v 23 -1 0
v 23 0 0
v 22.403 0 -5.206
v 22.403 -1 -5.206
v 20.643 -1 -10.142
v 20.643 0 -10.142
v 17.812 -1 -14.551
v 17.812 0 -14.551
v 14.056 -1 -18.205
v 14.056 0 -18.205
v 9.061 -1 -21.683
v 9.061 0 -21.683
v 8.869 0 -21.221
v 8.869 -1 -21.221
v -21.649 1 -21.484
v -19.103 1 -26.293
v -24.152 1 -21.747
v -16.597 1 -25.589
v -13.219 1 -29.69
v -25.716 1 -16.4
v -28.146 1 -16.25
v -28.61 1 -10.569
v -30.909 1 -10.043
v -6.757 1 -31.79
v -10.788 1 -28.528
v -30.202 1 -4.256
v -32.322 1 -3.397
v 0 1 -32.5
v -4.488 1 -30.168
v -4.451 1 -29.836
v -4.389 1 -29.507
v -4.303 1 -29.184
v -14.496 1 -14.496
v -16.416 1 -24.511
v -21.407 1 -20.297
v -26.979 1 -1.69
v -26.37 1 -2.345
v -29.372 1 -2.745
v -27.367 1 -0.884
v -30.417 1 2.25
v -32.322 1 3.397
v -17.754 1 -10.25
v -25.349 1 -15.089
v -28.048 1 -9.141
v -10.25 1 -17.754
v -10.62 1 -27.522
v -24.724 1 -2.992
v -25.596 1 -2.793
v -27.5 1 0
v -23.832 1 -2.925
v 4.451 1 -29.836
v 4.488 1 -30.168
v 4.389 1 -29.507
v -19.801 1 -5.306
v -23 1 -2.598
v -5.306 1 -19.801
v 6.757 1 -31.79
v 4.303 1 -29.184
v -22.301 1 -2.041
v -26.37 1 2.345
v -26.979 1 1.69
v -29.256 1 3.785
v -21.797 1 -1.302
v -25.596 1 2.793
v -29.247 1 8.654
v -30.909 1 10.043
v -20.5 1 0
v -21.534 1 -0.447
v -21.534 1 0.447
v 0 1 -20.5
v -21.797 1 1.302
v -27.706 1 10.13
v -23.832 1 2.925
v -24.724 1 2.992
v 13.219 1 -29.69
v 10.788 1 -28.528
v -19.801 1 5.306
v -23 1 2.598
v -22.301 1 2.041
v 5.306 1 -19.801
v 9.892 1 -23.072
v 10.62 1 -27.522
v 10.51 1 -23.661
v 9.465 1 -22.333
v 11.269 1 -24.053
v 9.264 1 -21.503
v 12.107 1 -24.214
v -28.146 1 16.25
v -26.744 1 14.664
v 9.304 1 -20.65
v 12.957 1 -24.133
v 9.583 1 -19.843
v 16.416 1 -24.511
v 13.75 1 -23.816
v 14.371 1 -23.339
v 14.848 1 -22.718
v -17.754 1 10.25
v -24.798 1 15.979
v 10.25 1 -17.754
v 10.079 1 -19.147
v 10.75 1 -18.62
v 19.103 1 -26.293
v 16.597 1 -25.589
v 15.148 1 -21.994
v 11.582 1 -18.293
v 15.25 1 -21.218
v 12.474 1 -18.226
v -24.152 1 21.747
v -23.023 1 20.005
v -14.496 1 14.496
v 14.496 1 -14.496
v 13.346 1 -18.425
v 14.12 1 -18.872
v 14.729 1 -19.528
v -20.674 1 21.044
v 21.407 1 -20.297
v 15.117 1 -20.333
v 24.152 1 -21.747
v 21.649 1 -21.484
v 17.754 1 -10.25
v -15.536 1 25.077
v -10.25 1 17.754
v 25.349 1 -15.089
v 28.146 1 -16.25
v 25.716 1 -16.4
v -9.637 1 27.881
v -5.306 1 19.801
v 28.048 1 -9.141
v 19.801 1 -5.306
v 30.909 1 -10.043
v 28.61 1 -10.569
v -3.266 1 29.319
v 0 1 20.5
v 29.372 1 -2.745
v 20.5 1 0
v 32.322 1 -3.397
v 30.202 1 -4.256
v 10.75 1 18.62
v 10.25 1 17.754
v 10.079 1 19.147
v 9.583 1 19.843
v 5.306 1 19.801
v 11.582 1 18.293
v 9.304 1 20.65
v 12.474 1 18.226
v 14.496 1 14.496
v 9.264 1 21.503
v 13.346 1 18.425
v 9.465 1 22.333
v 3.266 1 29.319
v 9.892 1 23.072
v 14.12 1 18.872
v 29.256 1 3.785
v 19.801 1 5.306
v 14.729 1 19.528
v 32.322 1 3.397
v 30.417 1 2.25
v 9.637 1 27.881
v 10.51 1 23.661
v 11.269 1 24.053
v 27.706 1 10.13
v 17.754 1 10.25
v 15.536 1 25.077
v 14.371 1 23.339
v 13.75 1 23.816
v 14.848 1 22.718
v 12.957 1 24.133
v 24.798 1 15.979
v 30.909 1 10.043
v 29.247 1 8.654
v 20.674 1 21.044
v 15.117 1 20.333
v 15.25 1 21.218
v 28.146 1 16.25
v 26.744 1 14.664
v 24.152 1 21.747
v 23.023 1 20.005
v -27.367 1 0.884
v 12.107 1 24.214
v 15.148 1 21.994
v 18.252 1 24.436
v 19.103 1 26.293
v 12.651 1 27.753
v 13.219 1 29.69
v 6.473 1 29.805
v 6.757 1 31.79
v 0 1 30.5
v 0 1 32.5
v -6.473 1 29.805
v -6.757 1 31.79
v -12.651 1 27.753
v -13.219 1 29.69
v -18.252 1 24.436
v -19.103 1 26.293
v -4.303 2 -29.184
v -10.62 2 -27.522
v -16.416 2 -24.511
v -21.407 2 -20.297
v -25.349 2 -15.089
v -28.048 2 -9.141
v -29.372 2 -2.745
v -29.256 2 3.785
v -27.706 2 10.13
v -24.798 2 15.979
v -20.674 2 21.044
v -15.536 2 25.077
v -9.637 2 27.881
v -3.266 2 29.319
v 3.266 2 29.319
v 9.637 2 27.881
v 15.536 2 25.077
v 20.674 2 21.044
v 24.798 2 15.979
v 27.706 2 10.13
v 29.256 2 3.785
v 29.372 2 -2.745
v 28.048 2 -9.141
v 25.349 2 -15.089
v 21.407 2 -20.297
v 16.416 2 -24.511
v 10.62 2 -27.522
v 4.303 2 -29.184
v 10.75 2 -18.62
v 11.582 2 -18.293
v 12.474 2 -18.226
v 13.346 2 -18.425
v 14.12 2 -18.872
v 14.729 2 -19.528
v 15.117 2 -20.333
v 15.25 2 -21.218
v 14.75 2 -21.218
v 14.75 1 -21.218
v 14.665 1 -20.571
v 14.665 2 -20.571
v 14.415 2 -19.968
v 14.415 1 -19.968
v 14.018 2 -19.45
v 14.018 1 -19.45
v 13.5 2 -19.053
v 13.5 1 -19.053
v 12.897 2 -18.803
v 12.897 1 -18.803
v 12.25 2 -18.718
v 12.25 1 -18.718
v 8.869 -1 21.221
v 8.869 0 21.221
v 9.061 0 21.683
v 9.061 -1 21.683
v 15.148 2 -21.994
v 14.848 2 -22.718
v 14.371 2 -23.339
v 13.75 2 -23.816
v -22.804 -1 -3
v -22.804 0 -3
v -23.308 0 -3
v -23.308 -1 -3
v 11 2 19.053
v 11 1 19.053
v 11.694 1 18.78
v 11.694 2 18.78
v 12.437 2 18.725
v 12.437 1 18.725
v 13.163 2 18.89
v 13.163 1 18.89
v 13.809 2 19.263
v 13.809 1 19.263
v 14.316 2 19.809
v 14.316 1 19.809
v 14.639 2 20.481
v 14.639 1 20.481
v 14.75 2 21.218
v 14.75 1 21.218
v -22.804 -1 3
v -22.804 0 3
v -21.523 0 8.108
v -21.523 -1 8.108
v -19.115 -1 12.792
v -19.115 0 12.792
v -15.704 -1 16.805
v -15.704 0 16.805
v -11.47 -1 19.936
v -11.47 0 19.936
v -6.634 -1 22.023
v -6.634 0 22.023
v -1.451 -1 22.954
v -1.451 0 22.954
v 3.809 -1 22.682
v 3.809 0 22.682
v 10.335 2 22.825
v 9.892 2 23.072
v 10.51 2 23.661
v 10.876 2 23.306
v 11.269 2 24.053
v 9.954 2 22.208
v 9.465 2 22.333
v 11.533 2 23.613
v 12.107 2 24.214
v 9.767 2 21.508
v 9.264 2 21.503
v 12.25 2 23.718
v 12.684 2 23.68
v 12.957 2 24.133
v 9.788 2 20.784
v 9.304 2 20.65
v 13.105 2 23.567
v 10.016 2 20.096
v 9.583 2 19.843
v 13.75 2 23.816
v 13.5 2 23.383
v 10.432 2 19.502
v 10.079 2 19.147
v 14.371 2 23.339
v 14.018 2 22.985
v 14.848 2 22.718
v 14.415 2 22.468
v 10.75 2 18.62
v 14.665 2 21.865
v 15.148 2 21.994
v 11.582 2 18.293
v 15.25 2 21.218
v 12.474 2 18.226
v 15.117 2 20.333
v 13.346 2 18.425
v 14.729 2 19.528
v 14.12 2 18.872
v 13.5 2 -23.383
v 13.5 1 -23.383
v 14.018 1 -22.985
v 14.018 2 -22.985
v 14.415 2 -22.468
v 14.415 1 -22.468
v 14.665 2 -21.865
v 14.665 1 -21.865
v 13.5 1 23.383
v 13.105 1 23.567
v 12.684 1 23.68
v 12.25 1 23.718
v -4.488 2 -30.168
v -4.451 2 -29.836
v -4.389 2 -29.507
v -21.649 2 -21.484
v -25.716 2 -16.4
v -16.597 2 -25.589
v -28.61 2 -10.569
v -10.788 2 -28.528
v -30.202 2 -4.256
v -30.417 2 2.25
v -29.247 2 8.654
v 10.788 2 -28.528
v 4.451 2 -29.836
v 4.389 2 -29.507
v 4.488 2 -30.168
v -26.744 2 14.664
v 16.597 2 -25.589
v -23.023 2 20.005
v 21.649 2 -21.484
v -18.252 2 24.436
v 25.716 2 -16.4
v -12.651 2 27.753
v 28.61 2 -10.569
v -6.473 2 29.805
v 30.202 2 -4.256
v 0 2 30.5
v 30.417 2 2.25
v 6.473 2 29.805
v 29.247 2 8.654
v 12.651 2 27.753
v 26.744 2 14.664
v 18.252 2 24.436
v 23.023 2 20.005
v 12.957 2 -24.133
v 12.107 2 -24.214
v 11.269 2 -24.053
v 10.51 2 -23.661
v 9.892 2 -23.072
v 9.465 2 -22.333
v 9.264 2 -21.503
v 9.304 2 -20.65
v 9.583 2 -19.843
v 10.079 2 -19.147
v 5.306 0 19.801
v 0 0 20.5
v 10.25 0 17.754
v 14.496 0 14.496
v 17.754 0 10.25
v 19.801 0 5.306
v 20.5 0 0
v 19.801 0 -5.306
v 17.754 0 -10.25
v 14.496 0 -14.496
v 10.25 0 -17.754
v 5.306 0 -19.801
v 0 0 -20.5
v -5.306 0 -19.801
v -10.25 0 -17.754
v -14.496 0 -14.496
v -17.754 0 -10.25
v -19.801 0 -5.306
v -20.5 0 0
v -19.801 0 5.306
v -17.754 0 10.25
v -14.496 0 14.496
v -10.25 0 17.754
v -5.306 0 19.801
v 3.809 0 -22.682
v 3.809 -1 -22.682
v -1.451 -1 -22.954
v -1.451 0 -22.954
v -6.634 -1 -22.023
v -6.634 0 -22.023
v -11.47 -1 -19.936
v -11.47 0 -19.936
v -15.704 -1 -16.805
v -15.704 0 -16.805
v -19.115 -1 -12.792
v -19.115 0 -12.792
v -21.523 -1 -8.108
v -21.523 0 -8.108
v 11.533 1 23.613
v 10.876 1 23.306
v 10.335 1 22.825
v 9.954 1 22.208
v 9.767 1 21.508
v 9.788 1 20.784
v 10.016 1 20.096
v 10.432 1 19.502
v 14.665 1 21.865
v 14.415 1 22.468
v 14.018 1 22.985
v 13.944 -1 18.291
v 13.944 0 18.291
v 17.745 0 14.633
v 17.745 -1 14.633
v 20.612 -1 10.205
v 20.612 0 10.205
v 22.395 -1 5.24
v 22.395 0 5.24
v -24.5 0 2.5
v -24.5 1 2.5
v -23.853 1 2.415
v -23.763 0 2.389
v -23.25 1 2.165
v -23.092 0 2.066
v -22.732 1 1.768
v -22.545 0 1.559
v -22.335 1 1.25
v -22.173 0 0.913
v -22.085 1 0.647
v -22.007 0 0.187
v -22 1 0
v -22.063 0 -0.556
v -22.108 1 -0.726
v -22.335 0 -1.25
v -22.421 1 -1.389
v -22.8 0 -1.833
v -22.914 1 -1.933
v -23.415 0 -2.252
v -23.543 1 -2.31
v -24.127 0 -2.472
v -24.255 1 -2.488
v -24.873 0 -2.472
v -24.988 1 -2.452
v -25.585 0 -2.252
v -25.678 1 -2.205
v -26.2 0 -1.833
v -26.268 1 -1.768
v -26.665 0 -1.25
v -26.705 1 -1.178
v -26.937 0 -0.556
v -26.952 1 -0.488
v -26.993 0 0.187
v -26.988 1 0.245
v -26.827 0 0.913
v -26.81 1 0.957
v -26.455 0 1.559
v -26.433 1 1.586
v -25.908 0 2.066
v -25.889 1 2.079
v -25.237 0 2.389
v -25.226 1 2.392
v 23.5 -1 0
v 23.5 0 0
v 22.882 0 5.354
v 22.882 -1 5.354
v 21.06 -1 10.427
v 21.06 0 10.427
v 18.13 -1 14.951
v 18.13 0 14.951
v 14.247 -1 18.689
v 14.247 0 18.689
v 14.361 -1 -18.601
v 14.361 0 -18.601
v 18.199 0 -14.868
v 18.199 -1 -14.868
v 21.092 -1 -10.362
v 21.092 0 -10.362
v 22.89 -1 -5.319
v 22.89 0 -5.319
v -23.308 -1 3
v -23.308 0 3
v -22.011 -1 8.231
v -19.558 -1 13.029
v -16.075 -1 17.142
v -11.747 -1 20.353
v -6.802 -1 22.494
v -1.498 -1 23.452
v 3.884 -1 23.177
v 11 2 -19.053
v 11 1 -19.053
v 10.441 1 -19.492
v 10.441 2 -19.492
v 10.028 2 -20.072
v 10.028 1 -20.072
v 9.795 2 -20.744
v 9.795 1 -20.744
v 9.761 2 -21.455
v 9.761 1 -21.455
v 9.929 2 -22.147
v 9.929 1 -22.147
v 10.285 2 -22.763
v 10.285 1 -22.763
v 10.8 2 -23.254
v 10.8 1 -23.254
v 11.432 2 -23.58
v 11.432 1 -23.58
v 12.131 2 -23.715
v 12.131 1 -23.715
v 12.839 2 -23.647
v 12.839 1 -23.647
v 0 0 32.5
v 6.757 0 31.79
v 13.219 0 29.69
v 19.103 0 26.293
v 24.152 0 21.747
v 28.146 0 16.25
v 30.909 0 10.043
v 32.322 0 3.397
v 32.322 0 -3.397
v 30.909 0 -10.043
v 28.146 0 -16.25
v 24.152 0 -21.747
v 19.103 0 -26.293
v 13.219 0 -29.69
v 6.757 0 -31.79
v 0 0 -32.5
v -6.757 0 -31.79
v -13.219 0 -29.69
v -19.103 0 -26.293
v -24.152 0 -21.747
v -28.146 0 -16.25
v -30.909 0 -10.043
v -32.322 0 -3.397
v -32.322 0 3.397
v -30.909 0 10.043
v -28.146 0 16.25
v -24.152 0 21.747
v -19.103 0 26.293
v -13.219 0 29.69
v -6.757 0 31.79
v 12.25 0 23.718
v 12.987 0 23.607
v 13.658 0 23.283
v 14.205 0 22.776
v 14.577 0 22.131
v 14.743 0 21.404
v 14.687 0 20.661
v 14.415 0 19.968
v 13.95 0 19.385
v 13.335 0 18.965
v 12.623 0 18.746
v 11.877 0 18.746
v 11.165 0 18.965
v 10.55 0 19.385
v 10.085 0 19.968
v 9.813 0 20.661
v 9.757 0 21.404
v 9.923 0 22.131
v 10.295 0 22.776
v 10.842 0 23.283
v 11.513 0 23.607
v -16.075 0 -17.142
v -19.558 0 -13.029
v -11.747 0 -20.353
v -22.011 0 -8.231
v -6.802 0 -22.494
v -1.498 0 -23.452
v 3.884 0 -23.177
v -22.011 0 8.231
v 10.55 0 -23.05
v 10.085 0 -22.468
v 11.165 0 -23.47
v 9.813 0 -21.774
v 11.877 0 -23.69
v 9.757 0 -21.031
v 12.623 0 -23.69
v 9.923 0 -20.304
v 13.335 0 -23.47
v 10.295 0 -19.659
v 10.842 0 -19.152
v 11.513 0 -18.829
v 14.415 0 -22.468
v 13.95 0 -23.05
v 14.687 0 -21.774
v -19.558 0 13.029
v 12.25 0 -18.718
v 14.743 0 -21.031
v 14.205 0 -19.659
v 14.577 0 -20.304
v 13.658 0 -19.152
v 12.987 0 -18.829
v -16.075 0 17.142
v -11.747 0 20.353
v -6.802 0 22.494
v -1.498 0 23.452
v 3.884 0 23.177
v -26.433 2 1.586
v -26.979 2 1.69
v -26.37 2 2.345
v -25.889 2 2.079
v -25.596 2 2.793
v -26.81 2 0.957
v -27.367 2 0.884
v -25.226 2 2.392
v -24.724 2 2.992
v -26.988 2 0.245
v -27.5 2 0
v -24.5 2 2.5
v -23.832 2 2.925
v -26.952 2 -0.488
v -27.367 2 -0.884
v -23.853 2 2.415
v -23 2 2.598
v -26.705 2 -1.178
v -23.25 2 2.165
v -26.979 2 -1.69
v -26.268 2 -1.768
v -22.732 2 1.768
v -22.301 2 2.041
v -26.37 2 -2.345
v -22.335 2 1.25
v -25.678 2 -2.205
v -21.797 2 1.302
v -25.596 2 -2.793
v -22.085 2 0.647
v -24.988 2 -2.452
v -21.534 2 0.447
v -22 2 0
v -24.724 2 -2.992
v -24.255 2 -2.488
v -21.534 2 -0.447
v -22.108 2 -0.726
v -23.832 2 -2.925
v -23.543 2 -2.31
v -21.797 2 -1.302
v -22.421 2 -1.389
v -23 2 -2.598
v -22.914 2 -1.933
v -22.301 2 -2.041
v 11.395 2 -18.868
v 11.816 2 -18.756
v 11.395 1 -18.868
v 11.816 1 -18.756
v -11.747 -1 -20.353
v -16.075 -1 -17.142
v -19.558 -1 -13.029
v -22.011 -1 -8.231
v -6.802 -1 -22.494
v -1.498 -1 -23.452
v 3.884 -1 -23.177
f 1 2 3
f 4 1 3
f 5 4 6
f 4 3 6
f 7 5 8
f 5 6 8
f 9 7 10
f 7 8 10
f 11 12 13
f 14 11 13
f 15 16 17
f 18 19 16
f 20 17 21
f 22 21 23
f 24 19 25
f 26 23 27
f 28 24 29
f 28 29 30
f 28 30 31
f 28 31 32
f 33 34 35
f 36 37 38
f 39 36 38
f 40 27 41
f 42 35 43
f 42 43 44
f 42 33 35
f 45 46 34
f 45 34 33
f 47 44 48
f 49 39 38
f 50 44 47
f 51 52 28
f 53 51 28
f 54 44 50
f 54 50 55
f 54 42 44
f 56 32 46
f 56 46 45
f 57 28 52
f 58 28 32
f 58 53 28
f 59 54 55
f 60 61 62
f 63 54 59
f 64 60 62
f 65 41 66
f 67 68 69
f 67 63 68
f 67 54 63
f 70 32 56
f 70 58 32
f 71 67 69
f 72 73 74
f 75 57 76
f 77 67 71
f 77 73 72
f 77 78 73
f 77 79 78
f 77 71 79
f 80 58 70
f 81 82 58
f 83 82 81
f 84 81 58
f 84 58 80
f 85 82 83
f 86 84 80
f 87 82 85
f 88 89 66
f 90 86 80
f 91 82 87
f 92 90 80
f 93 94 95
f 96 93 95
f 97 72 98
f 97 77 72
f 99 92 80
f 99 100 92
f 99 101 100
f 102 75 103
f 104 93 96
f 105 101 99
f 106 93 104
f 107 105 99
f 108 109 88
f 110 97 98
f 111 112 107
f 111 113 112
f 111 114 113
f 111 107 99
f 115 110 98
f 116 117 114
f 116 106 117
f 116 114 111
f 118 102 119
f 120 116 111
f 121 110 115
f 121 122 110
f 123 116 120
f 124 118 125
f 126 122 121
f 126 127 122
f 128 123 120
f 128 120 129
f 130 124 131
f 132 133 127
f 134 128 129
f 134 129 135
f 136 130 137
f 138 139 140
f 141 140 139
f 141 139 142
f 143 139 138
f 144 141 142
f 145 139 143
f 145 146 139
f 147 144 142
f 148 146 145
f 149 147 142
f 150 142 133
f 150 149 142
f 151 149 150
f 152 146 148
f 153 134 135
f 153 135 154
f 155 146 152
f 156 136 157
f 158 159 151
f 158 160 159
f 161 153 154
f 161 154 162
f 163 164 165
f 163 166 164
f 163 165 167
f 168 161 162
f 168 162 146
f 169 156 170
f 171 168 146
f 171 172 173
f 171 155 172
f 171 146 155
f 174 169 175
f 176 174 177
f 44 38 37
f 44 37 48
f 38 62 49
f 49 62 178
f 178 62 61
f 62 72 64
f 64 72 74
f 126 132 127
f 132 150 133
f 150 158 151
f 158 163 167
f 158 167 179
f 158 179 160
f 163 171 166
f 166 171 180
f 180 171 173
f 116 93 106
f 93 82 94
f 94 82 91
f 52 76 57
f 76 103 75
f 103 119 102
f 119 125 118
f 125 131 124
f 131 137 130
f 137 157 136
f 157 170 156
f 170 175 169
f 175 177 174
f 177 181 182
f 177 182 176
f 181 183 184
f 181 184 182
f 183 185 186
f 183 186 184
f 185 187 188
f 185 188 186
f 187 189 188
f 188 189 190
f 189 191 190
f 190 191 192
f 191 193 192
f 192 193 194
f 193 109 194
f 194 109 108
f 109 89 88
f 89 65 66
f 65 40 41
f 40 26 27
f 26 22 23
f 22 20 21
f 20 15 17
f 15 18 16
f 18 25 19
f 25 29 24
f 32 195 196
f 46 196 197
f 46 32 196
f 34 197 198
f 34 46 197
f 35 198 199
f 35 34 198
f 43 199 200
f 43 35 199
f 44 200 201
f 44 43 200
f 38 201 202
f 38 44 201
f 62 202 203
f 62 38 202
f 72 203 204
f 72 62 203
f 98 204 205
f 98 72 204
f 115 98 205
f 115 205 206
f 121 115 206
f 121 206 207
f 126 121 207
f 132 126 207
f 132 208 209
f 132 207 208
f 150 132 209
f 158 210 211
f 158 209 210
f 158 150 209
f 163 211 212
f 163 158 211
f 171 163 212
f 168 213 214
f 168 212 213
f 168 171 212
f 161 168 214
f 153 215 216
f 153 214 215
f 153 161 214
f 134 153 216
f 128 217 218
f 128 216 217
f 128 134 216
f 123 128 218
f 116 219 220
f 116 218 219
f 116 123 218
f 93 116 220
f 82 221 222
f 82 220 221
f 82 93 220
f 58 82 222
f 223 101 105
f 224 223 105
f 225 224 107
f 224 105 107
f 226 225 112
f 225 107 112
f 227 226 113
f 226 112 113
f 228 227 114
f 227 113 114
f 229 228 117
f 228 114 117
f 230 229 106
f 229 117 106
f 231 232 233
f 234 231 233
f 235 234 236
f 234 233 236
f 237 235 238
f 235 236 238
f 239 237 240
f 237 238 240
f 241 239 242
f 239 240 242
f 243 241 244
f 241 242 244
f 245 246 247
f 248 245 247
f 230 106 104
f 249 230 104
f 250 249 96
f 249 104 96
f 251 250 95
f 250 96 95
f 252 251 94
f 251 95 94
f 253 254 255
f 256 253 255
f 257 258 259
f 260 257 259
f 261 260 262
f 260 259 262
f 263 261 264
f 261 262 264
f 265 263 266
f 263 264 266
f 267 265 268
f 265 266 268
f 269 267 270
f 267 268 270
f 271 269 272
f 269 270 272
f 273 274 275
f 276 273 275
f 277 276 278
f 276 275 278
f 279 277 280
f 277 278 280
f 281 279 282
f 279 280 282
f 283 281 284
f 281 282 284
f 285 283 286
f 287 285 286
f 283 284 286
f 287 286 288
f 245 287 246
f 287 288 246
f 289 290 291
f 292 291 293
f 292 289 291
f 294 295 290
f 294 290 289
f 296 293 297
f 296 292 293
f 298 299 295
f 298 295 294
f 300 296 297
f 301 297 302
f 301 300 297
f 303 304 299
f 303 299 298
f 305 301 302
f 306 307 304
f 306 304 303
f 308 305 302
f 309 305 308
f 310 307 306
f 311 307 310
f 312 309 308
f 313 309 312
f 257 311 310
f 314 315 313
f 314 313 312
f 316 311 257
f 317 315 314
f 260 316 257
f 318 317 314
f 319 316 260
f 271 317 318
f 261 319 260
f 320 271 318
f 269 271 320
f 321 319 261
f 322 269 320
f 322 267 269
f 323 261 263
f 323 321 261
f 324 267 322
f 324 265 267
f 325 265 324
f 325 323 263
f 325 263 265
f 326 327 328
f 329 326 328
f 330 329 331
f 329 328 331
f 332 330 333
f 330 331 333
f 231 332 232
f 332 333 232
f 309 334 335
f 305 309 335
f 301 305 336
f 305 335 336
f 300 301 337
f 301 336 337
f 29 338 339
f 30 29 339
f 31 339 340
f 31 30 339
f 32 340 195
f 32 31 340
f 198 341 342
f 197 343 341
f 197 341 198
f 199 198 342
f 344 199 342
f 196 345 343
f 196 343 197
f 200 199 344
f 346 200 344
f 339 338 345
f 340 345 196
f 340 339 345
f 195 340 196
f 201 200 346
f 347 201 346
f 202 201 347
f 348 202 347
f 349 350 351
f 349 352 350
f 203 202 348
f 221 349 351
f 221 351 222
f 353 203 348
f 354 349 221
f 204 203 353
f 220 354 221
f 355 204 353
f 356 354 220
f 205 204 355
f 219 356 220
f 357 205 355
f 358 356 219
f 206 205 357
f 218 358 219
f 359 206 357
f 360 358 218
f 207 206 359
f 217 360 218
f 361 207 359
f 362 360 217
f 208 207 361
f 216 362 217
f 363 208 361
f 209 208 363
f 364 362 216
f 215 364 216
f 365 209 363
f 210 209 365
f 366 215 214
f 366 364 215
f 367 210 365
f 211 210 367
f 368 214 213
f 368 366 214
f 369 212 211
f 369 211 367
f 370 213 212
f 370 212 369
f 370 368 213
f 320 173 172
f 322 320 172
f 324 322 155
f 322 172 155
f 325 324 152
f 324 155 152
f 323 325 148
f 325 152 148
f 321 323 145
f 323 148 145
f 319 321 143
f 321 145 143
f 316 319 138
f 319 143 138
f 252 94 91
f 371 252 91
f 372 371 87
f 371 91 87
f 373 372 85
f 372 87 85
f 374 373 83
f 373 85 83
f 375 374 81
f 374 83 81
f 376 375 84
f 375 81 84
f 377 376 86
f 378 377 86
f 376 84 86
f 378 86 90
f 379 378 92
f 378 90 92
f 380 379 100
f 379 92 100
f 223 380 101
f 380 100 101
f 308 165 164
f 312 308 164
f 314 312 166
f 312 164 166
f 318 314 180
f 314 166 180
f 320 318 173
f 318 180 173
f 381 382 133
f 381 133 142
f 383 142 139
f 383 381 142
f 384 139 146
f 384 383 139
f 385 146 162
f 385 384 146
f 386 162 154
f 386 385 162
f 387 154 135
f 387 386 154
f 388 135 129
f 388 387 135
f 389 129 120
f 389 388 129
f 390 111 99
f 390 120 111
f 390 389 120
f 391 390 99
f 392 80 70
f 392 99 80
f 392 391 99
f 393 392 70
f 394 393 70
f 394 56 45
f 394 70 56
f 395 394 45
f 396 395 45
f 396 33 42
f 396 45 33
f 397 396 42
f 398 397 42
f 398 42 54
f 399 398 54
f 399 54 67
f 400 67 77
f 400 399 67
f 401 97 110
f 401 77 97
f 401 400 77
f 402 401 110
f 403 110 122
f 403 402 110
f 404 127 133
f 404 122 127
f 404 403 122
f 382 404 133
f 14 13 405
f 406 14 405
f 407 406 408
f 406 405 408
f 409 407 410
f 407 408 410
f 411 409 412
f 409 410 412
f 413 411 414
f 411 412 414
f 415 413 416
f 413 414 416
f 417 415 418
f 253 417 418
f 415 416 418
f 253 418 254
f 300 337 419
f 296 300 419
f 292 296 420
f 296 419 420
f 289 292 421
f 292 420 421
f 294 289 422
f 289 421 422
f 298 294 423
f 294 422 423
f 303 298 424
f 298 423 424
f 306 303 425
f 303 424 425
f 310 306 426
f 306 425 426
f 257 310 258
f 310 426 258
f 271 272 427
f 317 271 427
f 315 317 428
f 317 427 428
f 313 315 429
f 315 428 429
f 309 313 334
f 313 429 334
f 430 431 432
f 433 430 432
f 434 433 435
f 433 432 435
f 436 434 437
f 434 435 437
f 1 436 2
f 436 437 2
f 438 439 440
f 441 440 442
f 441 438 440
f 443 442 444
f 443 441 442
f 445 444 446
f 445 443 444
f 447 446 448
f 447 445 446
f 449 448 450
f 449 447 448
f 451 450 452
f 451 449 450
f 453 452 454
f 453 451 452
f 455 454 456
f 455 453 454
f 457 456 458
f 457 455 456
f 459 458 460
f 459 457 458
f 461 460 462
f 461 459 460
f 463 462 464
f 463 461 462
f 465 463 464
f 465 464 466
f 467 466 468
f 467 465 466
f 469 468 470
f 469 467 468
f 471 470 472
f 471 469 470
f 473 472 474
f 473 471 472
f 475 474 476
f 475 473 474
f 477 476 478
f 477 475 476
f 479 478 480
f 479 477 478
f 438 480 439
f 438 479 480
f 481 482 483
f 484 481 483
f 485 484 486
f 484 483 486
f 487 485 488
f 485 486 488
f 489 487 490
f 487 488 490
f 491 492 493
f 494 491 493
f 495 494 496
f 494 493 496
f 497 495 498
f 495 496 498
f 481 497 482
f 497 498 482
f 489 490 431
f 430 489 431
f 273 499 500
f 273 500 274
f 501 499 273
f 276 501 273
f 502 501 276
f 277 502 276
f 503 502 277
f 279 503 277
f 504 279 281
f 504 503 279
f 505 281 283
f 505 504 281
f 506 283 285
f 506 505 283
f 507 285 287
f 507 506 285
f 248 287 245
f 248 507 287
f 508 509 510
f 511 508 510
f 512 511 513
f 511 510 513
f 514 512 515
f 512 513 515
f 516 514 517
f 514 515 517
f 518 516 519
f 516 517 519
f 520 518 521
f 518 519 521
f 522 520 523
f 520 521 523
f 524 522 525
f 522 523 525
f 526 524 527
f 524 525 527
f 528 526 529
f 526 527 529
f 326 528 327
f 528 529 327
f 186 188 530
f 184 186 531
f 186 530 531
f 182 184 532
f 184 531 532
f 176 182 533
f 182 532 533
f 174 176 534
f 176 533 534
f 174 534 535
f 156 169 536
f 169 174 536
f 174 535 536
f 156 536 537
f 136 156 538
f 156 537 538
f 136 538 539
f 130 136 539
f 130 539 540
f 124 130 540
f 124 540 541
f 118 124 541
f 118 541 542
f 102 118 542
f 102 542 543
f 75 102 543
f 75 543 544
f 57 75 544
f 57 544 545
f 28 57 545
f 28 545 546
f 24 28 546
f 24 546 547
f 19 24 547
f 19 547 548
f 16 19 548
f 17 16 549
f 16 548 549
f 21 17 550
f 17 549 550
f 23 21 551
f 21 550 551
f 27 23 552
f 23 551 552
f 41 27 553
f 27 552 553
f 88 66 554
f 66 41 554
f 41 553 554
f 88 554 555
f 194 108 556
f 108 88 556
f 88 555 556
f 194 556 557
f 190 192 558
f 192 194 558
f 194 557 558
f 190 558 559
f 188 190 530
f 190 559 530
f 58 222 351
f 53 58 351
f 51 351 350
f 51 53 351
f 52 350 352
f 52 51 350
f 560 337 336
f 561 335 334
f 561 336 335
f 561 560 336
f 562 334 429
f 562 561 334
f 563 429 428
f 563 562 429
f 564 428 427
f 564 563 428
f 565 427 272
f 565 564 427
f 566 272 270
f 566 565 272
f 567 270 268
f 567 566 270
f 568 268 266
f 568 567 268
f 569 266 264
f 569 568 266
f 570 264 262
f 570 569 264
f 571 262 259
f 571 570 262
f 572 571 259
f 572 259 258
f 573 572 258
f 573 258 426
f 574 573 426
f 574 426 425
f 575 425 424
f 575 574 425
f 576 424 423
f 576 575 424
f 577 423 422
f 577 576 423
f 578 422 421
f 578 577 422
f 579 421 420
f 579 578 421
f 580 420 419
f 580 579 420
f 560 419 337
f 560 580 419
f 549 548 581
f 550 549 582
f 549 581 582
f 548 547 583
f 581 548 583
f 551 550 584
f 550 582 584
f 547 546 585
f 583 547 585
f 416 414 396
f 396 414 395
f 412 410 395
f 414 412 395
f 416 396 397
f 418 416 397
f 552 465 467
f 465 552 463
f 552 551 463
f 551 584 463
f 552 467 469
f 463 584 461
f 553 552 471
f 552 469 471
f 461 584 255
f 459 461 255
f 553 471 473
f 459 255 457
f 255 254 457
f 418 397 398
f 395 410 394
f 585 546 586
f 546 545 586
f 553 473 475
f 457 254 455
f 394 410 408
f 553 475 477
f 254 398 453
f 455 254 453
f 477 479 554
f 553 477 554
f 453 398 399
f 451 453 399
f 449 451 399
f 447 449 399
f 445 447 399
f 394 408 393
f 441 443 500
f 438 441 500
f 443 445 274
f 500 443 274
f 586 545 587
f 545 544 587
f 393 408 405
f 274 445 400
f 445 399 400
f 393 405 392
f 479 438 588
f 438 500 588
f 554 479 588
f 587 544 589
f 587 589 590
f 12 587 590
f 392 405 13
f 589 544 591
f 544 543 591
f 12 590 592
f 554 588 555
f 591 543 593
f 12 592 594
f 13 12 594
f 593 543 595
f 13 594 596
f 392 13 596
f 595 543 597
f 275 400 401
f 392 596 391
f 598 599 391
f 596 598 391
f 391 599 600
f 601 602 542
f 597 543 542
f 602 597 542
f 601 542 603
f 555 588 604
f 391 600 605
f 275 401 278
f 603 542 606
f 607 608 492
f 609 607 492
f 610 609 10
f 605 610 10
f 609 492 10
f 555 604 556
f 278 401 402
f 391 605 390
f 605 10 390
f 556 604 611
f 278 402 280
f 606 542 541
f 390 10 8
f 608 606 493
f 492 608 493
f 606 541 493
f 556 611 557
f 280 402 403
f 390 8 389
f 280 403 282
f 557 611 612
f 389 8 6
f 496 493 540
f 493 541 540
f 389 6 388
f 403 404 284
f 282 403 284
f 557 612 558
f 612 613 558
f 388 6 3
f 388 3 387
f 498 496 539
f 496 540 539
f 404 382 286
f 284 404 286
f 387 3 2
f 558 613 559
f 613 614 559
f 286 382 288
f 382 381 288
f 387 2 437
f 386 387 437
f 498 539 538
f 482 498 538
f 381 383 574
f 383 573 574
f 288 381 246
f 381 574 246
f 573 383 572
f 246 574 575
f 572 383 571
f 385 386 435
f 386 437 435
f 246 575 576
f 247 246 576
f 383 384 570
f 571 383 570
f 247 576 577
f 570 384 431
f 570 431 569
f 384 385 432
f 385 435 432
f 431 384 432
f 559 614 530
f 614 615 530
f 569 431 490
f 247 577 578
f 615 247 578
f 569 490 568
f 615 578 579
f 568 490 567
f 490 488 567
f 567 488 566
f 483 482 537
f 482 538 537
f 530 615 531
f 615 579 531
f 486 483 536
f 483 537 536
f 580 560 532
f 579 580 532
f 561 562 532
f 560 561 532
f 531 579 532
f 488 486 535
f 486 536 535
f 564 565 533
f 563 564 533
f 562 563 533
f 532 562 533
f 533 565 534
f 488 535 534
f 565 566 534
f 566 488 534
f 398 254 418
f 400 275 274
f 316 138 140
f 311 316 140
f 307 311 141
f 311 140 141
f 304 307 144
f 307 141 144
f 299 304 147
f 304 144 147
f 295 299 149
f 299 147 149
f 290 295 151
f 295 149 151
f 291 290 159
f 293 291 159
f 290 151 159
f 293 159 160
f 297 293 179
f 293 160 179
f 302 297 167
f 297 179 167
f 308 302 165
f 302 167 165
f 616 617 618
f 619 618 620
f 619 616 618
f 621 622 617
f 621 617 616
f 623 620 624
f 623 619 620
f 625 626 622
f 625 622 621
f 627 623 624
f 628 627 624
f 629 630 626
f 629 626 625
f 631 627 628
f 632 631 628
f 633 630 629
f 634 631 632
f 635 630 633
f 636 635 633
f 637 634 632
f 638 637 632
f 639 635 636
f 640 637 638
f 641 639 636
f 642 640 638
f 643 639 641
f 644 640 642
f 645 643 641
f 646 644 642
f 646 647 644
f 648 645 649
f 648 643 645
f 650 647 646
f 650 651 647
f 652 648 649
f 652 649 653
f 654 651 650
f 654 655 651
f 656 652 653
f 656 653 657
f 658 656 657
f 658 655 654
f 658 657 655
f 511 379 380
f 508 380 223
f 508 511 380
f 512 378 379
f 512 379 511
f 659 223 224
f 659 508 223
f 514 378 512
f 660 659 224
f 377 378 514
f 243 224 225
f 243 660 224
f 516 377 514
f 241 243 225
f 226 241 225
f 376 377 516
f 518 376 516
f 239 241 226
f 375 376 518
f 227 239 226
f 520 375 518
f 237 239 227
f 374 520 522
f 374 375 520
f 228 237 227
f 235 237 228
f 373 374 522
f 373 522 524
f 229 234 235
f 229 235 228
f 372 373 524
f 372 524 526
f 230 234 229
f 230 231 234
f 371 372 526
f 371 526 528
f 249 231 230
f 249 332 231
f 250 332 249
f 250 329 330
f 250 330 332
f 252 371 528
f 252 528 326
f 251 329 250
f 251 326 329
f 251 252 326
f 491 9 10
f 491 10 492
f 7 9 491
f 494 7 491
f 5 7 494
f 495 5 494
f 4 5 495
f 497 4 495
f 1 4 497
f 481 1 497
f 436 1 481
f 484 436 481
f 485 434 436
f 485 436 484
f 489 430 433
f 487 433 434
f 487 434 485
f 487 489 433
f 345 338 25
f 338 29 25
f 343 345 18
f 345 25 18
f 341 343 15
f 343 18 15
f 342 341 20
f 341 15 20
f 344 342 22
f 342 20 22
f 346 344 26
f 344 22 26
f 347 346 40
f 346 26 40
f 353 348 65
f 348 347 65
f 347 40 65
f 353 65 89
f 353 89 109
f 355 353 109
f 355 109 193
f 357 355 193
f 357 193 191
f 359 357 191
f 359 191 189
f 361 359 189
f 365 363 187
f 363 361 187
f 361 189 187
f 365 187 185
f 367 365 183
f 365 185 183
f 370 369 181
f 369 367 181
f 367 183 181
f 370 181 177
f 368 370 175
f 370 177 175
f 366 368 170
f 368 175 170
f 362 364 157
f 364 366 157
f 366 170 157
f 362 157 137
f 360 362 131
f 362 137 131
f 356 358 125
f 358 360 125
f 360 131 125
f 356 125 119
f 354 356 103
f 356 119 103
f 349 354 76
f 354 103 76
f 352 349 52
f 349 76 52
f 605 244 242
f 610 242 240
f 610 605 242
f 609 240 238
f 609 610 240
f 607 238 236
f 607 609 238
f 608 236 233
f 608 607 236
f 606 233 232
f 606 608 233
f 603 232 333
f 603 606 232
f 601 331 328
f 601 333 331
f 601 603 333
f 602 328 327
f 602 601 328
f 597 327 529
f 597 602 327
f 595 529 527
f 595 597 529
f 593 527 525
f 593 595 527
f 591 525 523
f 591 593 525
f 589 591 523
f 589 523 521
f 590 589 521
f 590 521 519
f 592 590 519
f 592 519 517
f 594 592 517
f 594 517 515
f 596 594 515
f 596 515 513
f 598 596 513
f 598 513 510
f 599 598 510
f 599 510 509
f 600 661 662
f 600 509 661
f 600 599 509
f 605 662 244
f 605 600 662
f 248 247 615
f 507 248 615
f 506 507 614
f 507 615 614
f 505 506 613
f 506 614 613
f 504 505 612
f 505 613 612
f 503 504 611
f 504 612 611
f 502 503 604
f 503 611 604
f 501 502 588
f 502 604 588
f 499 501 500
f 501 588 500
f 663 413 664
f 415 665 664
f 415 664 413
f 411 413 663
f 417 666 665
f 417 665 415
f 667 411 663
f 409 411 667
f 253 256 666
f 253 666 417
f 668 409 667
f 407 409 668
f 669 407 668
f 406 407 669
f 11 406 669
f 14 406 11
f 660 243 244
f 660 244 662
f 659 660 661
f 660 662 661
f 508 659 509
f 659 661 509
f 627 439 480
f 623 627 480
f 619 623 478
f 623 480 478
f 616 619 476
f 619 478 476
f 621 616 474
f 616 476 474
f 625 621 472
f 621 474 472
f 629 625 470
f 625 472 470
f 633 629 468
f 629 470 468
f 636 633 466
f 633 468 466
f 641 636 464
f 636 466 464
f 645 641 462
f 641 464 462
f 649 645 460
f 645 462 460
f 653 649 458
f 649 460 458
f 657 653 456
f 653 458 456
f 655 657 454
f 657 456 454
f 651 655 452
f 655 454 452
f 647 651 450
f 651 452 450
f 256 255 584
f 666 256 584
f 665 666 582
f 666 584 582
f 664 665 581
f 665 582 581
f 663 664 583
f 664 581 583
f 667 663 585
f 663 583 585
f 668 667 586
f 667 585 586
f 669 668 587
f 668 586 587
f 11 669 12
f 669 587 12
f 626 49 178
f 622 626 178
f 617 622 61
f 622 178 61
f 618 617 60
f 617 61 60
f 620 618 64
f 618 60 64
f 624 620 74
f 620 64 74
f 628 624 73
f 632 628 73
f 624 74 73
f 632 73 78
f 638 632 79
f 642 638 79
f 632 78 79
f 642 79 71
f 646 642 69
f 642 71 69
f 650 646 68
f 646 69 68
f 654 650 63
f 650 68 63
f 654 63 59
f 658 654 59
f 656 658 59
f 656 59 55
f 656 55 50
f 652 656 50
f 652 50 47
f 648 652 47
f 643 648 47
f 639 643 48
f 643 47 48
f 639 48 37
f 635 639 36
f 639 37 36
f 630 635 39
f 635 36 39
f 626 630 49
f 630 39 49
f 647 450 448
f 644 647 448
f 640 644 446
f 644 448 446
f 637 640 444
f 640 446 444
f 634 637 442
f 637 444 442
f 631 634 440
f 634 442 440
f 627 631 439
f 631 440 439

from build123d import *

# Parameters (mm, degrees)
CROQUIS1_R                 = 32.5
CROQUIS1_R_2               = 20.5
SALIENTE_EXTRUIR1_DEPTH    = 2
CORTAR_EXTRUIR1_START      = -1
CROQUIS2_R                 = 32.5
CROQUIS2_R_2               = 20.5
CORTAR_EXTRUIR1_DEPTH      = 1
CROQUIS3_R                 = 3
CROQUIS3_R_2               = 2.5
SALIENTE_EXTRUIR2_DEPTH    = 1
CORTAR_EXTRUIR2_DEPTH      = 29
CORTAR_EXTRUIR2_DEPTH_BACK = 25
CROQUIS6_R                 = 2.5
SALIENTE_EXTRUIR3_DEPTH    = 1


with BuildPart() as part:
    # Croquis1 → Saliente-Extruir1 (new body)
    with BuildSketch(Plane(origin=(0, 0, 0), x_dir=(1, 0, 0), z_dir=(0, 1, 0))):
        Circle(CROQUIS1_R)
        Circle(CROQUIS1_R_2, mode=Mode.SUBTRACT)
    extrude(amount=SALIENTE_EXTRUIR1_DEPTH)

    # Croquis2 → Cortar-Extruir1 (cut)
    with BuildSketch(Plane(origin=(0, 2, 0), x_dir=(1, 0, 0), z_dir=(0, 1, 0)).offset(CORTAR_EXTRUIR1_START)):
        Circle(CROQUIS2_R)
        with BuildLine():
            ThreePointArc((4.487738603, 30.168032787), (0, -30.5), (-4.487738603, 30.168032787))
            ThreePointArc((-4.487738603, 30.168032787), (-4.42299753, 29.671089358), (-4.303401638, 29.18442623))
            ThreePointArc((-4.303401638, 29.18442623), (0, -29.5), (4.303401638, 29.18442623))
            ThreePointArc((4.303401638, 29.18442623), (4.42299753, 29.671089358), (4.487738603, 30.168032787))
        make_face(mode=Mode.SUBTRACT)
        Circle(CROQUIS2_R_2, mode=Mode.SUBTRACT)
    extrude(amount=CORTAR_EXTRUIR1_DEPTH, mode=Mode.SUBTRACT)

    # Croquis3 → Saliente-Extruir2 (add)
    # profile 1 of 3: a face of its own
    with BuildSketch(Plane(origin=(0, 1, 0), x_dir=(1, 0, 0), z_dir=(0, 1, 0))):
        with Locations((-24.5, 0)):
            Circle(CROQUIS3_R)
        with Locations((-24.5, 0)):
            Circle(CROQUIS3_R_2, mode=Mode.SUBTRACT)
    # profile 2 of 3: a face of its own
    with BuildSketch(Plane(origin=(0, 1, 0), x_dir=(1, 0, 0), z_dir=(0, 1, 0))):
        with Locations((12.25, 21.217622393)):
            Circle(CROQUIS3_R)
        with Locations((12.25, 21.217622393)):
            Circle(CROQUIS3_R_2, mode=Mode.SUBTRACT)
    # profile 3 of 3: a face of its own
    with BuildSketch(Plane(origin=(0, 1, 0), x_dir=(1, 0, 0), z_dir=(0, 1, 0))):
        with Locations((12.25, -21.217622393)):
            Circle(CROQUIS3_R)
        with Locations((12.25, -21.217622393)):
            Circle(CROQUIS3_R_2, mode=Mode.SUBTRACT)
    extrude(amount=SALIENTE_EXTRUIR2_DEPTH)

    # Croquis6 → Cortar-Extruir2 (cut, two sides: drawn at the far end of the back side and taken through both)
    with BuildSketch(Plane(origin=(0, 1, 0), x_dir=(1, 0, 0), z_dir=(0, 1, 0)).offset(-CORTAR_EXTRUIR2_DEPTH_BACK)):
        with Locations((-24.5, 0)):
            Circle(CROQUIS6_R)
        with Locations((12.25, -21.217622393)):
            Circle(CROQUIS6_R)
        with Locations((12.25, 21.217622393)):
            Circle(CROQUIS6_R)
    extrude(amount=CORTAR_EXTRUIR2_DEPTH + CORTAR_EXTRUIR2_DEPTH_BACK, mode=Mode.SUBTRACT)

    # Croquis7 → Saliente-Extruir3 (add)
    with BuildSketch(Plane.XZ):
        with BuildLine():
            ThreePointArc((9.061477105, 21.682703537), (-11.747329093, 20.353138804), (-23.307724042, 3))
            Line((-23.307724042, 3), (-22.803508502, 3))
            ThreePointArc((-22.803508502, 3), (-11.469500389, 19.936162139), (8.86867972, 21.221369419))
            Line((8.86867972, 21.221369419), (9.061477105, 21.682703537))
        make_face()
        with BuildLine():
            Line((-22.803508502, -3), (-23.307724042, -3))
            ThreePointArc((-23.307724042, -3), (-11.747329093, -20.353138804), (9.061477105, -21.682703537))
            Line((9.061477105, -21.682703537), (8.86867972, -21.221369419))
            ThreePointArc((8.86867972, -21.221369419), (-11.469500389, -19.936162139), (-22.803508502, -3))
        make_face()
        with BuildLine():
            ThreePointArc((14.36118164, -18.601248934), (23.4998899, 0.071935181), (14.247033533, 18.688821137))
            Line((14.247033533, 18.688821137), (13.94390516, 18.291186645))
            ThreePointArc((13.94390516, 18.291186645), (22.999892243, 0.070404645), (14.055624583, -18.20547768))
            Line((14.055624583, -18.20547768), (14.36118164, -18.601248934))
        make_face()
    extrude(amount=SALIENTE_EXTRUIR3_DEPTH)


solid = part.part
